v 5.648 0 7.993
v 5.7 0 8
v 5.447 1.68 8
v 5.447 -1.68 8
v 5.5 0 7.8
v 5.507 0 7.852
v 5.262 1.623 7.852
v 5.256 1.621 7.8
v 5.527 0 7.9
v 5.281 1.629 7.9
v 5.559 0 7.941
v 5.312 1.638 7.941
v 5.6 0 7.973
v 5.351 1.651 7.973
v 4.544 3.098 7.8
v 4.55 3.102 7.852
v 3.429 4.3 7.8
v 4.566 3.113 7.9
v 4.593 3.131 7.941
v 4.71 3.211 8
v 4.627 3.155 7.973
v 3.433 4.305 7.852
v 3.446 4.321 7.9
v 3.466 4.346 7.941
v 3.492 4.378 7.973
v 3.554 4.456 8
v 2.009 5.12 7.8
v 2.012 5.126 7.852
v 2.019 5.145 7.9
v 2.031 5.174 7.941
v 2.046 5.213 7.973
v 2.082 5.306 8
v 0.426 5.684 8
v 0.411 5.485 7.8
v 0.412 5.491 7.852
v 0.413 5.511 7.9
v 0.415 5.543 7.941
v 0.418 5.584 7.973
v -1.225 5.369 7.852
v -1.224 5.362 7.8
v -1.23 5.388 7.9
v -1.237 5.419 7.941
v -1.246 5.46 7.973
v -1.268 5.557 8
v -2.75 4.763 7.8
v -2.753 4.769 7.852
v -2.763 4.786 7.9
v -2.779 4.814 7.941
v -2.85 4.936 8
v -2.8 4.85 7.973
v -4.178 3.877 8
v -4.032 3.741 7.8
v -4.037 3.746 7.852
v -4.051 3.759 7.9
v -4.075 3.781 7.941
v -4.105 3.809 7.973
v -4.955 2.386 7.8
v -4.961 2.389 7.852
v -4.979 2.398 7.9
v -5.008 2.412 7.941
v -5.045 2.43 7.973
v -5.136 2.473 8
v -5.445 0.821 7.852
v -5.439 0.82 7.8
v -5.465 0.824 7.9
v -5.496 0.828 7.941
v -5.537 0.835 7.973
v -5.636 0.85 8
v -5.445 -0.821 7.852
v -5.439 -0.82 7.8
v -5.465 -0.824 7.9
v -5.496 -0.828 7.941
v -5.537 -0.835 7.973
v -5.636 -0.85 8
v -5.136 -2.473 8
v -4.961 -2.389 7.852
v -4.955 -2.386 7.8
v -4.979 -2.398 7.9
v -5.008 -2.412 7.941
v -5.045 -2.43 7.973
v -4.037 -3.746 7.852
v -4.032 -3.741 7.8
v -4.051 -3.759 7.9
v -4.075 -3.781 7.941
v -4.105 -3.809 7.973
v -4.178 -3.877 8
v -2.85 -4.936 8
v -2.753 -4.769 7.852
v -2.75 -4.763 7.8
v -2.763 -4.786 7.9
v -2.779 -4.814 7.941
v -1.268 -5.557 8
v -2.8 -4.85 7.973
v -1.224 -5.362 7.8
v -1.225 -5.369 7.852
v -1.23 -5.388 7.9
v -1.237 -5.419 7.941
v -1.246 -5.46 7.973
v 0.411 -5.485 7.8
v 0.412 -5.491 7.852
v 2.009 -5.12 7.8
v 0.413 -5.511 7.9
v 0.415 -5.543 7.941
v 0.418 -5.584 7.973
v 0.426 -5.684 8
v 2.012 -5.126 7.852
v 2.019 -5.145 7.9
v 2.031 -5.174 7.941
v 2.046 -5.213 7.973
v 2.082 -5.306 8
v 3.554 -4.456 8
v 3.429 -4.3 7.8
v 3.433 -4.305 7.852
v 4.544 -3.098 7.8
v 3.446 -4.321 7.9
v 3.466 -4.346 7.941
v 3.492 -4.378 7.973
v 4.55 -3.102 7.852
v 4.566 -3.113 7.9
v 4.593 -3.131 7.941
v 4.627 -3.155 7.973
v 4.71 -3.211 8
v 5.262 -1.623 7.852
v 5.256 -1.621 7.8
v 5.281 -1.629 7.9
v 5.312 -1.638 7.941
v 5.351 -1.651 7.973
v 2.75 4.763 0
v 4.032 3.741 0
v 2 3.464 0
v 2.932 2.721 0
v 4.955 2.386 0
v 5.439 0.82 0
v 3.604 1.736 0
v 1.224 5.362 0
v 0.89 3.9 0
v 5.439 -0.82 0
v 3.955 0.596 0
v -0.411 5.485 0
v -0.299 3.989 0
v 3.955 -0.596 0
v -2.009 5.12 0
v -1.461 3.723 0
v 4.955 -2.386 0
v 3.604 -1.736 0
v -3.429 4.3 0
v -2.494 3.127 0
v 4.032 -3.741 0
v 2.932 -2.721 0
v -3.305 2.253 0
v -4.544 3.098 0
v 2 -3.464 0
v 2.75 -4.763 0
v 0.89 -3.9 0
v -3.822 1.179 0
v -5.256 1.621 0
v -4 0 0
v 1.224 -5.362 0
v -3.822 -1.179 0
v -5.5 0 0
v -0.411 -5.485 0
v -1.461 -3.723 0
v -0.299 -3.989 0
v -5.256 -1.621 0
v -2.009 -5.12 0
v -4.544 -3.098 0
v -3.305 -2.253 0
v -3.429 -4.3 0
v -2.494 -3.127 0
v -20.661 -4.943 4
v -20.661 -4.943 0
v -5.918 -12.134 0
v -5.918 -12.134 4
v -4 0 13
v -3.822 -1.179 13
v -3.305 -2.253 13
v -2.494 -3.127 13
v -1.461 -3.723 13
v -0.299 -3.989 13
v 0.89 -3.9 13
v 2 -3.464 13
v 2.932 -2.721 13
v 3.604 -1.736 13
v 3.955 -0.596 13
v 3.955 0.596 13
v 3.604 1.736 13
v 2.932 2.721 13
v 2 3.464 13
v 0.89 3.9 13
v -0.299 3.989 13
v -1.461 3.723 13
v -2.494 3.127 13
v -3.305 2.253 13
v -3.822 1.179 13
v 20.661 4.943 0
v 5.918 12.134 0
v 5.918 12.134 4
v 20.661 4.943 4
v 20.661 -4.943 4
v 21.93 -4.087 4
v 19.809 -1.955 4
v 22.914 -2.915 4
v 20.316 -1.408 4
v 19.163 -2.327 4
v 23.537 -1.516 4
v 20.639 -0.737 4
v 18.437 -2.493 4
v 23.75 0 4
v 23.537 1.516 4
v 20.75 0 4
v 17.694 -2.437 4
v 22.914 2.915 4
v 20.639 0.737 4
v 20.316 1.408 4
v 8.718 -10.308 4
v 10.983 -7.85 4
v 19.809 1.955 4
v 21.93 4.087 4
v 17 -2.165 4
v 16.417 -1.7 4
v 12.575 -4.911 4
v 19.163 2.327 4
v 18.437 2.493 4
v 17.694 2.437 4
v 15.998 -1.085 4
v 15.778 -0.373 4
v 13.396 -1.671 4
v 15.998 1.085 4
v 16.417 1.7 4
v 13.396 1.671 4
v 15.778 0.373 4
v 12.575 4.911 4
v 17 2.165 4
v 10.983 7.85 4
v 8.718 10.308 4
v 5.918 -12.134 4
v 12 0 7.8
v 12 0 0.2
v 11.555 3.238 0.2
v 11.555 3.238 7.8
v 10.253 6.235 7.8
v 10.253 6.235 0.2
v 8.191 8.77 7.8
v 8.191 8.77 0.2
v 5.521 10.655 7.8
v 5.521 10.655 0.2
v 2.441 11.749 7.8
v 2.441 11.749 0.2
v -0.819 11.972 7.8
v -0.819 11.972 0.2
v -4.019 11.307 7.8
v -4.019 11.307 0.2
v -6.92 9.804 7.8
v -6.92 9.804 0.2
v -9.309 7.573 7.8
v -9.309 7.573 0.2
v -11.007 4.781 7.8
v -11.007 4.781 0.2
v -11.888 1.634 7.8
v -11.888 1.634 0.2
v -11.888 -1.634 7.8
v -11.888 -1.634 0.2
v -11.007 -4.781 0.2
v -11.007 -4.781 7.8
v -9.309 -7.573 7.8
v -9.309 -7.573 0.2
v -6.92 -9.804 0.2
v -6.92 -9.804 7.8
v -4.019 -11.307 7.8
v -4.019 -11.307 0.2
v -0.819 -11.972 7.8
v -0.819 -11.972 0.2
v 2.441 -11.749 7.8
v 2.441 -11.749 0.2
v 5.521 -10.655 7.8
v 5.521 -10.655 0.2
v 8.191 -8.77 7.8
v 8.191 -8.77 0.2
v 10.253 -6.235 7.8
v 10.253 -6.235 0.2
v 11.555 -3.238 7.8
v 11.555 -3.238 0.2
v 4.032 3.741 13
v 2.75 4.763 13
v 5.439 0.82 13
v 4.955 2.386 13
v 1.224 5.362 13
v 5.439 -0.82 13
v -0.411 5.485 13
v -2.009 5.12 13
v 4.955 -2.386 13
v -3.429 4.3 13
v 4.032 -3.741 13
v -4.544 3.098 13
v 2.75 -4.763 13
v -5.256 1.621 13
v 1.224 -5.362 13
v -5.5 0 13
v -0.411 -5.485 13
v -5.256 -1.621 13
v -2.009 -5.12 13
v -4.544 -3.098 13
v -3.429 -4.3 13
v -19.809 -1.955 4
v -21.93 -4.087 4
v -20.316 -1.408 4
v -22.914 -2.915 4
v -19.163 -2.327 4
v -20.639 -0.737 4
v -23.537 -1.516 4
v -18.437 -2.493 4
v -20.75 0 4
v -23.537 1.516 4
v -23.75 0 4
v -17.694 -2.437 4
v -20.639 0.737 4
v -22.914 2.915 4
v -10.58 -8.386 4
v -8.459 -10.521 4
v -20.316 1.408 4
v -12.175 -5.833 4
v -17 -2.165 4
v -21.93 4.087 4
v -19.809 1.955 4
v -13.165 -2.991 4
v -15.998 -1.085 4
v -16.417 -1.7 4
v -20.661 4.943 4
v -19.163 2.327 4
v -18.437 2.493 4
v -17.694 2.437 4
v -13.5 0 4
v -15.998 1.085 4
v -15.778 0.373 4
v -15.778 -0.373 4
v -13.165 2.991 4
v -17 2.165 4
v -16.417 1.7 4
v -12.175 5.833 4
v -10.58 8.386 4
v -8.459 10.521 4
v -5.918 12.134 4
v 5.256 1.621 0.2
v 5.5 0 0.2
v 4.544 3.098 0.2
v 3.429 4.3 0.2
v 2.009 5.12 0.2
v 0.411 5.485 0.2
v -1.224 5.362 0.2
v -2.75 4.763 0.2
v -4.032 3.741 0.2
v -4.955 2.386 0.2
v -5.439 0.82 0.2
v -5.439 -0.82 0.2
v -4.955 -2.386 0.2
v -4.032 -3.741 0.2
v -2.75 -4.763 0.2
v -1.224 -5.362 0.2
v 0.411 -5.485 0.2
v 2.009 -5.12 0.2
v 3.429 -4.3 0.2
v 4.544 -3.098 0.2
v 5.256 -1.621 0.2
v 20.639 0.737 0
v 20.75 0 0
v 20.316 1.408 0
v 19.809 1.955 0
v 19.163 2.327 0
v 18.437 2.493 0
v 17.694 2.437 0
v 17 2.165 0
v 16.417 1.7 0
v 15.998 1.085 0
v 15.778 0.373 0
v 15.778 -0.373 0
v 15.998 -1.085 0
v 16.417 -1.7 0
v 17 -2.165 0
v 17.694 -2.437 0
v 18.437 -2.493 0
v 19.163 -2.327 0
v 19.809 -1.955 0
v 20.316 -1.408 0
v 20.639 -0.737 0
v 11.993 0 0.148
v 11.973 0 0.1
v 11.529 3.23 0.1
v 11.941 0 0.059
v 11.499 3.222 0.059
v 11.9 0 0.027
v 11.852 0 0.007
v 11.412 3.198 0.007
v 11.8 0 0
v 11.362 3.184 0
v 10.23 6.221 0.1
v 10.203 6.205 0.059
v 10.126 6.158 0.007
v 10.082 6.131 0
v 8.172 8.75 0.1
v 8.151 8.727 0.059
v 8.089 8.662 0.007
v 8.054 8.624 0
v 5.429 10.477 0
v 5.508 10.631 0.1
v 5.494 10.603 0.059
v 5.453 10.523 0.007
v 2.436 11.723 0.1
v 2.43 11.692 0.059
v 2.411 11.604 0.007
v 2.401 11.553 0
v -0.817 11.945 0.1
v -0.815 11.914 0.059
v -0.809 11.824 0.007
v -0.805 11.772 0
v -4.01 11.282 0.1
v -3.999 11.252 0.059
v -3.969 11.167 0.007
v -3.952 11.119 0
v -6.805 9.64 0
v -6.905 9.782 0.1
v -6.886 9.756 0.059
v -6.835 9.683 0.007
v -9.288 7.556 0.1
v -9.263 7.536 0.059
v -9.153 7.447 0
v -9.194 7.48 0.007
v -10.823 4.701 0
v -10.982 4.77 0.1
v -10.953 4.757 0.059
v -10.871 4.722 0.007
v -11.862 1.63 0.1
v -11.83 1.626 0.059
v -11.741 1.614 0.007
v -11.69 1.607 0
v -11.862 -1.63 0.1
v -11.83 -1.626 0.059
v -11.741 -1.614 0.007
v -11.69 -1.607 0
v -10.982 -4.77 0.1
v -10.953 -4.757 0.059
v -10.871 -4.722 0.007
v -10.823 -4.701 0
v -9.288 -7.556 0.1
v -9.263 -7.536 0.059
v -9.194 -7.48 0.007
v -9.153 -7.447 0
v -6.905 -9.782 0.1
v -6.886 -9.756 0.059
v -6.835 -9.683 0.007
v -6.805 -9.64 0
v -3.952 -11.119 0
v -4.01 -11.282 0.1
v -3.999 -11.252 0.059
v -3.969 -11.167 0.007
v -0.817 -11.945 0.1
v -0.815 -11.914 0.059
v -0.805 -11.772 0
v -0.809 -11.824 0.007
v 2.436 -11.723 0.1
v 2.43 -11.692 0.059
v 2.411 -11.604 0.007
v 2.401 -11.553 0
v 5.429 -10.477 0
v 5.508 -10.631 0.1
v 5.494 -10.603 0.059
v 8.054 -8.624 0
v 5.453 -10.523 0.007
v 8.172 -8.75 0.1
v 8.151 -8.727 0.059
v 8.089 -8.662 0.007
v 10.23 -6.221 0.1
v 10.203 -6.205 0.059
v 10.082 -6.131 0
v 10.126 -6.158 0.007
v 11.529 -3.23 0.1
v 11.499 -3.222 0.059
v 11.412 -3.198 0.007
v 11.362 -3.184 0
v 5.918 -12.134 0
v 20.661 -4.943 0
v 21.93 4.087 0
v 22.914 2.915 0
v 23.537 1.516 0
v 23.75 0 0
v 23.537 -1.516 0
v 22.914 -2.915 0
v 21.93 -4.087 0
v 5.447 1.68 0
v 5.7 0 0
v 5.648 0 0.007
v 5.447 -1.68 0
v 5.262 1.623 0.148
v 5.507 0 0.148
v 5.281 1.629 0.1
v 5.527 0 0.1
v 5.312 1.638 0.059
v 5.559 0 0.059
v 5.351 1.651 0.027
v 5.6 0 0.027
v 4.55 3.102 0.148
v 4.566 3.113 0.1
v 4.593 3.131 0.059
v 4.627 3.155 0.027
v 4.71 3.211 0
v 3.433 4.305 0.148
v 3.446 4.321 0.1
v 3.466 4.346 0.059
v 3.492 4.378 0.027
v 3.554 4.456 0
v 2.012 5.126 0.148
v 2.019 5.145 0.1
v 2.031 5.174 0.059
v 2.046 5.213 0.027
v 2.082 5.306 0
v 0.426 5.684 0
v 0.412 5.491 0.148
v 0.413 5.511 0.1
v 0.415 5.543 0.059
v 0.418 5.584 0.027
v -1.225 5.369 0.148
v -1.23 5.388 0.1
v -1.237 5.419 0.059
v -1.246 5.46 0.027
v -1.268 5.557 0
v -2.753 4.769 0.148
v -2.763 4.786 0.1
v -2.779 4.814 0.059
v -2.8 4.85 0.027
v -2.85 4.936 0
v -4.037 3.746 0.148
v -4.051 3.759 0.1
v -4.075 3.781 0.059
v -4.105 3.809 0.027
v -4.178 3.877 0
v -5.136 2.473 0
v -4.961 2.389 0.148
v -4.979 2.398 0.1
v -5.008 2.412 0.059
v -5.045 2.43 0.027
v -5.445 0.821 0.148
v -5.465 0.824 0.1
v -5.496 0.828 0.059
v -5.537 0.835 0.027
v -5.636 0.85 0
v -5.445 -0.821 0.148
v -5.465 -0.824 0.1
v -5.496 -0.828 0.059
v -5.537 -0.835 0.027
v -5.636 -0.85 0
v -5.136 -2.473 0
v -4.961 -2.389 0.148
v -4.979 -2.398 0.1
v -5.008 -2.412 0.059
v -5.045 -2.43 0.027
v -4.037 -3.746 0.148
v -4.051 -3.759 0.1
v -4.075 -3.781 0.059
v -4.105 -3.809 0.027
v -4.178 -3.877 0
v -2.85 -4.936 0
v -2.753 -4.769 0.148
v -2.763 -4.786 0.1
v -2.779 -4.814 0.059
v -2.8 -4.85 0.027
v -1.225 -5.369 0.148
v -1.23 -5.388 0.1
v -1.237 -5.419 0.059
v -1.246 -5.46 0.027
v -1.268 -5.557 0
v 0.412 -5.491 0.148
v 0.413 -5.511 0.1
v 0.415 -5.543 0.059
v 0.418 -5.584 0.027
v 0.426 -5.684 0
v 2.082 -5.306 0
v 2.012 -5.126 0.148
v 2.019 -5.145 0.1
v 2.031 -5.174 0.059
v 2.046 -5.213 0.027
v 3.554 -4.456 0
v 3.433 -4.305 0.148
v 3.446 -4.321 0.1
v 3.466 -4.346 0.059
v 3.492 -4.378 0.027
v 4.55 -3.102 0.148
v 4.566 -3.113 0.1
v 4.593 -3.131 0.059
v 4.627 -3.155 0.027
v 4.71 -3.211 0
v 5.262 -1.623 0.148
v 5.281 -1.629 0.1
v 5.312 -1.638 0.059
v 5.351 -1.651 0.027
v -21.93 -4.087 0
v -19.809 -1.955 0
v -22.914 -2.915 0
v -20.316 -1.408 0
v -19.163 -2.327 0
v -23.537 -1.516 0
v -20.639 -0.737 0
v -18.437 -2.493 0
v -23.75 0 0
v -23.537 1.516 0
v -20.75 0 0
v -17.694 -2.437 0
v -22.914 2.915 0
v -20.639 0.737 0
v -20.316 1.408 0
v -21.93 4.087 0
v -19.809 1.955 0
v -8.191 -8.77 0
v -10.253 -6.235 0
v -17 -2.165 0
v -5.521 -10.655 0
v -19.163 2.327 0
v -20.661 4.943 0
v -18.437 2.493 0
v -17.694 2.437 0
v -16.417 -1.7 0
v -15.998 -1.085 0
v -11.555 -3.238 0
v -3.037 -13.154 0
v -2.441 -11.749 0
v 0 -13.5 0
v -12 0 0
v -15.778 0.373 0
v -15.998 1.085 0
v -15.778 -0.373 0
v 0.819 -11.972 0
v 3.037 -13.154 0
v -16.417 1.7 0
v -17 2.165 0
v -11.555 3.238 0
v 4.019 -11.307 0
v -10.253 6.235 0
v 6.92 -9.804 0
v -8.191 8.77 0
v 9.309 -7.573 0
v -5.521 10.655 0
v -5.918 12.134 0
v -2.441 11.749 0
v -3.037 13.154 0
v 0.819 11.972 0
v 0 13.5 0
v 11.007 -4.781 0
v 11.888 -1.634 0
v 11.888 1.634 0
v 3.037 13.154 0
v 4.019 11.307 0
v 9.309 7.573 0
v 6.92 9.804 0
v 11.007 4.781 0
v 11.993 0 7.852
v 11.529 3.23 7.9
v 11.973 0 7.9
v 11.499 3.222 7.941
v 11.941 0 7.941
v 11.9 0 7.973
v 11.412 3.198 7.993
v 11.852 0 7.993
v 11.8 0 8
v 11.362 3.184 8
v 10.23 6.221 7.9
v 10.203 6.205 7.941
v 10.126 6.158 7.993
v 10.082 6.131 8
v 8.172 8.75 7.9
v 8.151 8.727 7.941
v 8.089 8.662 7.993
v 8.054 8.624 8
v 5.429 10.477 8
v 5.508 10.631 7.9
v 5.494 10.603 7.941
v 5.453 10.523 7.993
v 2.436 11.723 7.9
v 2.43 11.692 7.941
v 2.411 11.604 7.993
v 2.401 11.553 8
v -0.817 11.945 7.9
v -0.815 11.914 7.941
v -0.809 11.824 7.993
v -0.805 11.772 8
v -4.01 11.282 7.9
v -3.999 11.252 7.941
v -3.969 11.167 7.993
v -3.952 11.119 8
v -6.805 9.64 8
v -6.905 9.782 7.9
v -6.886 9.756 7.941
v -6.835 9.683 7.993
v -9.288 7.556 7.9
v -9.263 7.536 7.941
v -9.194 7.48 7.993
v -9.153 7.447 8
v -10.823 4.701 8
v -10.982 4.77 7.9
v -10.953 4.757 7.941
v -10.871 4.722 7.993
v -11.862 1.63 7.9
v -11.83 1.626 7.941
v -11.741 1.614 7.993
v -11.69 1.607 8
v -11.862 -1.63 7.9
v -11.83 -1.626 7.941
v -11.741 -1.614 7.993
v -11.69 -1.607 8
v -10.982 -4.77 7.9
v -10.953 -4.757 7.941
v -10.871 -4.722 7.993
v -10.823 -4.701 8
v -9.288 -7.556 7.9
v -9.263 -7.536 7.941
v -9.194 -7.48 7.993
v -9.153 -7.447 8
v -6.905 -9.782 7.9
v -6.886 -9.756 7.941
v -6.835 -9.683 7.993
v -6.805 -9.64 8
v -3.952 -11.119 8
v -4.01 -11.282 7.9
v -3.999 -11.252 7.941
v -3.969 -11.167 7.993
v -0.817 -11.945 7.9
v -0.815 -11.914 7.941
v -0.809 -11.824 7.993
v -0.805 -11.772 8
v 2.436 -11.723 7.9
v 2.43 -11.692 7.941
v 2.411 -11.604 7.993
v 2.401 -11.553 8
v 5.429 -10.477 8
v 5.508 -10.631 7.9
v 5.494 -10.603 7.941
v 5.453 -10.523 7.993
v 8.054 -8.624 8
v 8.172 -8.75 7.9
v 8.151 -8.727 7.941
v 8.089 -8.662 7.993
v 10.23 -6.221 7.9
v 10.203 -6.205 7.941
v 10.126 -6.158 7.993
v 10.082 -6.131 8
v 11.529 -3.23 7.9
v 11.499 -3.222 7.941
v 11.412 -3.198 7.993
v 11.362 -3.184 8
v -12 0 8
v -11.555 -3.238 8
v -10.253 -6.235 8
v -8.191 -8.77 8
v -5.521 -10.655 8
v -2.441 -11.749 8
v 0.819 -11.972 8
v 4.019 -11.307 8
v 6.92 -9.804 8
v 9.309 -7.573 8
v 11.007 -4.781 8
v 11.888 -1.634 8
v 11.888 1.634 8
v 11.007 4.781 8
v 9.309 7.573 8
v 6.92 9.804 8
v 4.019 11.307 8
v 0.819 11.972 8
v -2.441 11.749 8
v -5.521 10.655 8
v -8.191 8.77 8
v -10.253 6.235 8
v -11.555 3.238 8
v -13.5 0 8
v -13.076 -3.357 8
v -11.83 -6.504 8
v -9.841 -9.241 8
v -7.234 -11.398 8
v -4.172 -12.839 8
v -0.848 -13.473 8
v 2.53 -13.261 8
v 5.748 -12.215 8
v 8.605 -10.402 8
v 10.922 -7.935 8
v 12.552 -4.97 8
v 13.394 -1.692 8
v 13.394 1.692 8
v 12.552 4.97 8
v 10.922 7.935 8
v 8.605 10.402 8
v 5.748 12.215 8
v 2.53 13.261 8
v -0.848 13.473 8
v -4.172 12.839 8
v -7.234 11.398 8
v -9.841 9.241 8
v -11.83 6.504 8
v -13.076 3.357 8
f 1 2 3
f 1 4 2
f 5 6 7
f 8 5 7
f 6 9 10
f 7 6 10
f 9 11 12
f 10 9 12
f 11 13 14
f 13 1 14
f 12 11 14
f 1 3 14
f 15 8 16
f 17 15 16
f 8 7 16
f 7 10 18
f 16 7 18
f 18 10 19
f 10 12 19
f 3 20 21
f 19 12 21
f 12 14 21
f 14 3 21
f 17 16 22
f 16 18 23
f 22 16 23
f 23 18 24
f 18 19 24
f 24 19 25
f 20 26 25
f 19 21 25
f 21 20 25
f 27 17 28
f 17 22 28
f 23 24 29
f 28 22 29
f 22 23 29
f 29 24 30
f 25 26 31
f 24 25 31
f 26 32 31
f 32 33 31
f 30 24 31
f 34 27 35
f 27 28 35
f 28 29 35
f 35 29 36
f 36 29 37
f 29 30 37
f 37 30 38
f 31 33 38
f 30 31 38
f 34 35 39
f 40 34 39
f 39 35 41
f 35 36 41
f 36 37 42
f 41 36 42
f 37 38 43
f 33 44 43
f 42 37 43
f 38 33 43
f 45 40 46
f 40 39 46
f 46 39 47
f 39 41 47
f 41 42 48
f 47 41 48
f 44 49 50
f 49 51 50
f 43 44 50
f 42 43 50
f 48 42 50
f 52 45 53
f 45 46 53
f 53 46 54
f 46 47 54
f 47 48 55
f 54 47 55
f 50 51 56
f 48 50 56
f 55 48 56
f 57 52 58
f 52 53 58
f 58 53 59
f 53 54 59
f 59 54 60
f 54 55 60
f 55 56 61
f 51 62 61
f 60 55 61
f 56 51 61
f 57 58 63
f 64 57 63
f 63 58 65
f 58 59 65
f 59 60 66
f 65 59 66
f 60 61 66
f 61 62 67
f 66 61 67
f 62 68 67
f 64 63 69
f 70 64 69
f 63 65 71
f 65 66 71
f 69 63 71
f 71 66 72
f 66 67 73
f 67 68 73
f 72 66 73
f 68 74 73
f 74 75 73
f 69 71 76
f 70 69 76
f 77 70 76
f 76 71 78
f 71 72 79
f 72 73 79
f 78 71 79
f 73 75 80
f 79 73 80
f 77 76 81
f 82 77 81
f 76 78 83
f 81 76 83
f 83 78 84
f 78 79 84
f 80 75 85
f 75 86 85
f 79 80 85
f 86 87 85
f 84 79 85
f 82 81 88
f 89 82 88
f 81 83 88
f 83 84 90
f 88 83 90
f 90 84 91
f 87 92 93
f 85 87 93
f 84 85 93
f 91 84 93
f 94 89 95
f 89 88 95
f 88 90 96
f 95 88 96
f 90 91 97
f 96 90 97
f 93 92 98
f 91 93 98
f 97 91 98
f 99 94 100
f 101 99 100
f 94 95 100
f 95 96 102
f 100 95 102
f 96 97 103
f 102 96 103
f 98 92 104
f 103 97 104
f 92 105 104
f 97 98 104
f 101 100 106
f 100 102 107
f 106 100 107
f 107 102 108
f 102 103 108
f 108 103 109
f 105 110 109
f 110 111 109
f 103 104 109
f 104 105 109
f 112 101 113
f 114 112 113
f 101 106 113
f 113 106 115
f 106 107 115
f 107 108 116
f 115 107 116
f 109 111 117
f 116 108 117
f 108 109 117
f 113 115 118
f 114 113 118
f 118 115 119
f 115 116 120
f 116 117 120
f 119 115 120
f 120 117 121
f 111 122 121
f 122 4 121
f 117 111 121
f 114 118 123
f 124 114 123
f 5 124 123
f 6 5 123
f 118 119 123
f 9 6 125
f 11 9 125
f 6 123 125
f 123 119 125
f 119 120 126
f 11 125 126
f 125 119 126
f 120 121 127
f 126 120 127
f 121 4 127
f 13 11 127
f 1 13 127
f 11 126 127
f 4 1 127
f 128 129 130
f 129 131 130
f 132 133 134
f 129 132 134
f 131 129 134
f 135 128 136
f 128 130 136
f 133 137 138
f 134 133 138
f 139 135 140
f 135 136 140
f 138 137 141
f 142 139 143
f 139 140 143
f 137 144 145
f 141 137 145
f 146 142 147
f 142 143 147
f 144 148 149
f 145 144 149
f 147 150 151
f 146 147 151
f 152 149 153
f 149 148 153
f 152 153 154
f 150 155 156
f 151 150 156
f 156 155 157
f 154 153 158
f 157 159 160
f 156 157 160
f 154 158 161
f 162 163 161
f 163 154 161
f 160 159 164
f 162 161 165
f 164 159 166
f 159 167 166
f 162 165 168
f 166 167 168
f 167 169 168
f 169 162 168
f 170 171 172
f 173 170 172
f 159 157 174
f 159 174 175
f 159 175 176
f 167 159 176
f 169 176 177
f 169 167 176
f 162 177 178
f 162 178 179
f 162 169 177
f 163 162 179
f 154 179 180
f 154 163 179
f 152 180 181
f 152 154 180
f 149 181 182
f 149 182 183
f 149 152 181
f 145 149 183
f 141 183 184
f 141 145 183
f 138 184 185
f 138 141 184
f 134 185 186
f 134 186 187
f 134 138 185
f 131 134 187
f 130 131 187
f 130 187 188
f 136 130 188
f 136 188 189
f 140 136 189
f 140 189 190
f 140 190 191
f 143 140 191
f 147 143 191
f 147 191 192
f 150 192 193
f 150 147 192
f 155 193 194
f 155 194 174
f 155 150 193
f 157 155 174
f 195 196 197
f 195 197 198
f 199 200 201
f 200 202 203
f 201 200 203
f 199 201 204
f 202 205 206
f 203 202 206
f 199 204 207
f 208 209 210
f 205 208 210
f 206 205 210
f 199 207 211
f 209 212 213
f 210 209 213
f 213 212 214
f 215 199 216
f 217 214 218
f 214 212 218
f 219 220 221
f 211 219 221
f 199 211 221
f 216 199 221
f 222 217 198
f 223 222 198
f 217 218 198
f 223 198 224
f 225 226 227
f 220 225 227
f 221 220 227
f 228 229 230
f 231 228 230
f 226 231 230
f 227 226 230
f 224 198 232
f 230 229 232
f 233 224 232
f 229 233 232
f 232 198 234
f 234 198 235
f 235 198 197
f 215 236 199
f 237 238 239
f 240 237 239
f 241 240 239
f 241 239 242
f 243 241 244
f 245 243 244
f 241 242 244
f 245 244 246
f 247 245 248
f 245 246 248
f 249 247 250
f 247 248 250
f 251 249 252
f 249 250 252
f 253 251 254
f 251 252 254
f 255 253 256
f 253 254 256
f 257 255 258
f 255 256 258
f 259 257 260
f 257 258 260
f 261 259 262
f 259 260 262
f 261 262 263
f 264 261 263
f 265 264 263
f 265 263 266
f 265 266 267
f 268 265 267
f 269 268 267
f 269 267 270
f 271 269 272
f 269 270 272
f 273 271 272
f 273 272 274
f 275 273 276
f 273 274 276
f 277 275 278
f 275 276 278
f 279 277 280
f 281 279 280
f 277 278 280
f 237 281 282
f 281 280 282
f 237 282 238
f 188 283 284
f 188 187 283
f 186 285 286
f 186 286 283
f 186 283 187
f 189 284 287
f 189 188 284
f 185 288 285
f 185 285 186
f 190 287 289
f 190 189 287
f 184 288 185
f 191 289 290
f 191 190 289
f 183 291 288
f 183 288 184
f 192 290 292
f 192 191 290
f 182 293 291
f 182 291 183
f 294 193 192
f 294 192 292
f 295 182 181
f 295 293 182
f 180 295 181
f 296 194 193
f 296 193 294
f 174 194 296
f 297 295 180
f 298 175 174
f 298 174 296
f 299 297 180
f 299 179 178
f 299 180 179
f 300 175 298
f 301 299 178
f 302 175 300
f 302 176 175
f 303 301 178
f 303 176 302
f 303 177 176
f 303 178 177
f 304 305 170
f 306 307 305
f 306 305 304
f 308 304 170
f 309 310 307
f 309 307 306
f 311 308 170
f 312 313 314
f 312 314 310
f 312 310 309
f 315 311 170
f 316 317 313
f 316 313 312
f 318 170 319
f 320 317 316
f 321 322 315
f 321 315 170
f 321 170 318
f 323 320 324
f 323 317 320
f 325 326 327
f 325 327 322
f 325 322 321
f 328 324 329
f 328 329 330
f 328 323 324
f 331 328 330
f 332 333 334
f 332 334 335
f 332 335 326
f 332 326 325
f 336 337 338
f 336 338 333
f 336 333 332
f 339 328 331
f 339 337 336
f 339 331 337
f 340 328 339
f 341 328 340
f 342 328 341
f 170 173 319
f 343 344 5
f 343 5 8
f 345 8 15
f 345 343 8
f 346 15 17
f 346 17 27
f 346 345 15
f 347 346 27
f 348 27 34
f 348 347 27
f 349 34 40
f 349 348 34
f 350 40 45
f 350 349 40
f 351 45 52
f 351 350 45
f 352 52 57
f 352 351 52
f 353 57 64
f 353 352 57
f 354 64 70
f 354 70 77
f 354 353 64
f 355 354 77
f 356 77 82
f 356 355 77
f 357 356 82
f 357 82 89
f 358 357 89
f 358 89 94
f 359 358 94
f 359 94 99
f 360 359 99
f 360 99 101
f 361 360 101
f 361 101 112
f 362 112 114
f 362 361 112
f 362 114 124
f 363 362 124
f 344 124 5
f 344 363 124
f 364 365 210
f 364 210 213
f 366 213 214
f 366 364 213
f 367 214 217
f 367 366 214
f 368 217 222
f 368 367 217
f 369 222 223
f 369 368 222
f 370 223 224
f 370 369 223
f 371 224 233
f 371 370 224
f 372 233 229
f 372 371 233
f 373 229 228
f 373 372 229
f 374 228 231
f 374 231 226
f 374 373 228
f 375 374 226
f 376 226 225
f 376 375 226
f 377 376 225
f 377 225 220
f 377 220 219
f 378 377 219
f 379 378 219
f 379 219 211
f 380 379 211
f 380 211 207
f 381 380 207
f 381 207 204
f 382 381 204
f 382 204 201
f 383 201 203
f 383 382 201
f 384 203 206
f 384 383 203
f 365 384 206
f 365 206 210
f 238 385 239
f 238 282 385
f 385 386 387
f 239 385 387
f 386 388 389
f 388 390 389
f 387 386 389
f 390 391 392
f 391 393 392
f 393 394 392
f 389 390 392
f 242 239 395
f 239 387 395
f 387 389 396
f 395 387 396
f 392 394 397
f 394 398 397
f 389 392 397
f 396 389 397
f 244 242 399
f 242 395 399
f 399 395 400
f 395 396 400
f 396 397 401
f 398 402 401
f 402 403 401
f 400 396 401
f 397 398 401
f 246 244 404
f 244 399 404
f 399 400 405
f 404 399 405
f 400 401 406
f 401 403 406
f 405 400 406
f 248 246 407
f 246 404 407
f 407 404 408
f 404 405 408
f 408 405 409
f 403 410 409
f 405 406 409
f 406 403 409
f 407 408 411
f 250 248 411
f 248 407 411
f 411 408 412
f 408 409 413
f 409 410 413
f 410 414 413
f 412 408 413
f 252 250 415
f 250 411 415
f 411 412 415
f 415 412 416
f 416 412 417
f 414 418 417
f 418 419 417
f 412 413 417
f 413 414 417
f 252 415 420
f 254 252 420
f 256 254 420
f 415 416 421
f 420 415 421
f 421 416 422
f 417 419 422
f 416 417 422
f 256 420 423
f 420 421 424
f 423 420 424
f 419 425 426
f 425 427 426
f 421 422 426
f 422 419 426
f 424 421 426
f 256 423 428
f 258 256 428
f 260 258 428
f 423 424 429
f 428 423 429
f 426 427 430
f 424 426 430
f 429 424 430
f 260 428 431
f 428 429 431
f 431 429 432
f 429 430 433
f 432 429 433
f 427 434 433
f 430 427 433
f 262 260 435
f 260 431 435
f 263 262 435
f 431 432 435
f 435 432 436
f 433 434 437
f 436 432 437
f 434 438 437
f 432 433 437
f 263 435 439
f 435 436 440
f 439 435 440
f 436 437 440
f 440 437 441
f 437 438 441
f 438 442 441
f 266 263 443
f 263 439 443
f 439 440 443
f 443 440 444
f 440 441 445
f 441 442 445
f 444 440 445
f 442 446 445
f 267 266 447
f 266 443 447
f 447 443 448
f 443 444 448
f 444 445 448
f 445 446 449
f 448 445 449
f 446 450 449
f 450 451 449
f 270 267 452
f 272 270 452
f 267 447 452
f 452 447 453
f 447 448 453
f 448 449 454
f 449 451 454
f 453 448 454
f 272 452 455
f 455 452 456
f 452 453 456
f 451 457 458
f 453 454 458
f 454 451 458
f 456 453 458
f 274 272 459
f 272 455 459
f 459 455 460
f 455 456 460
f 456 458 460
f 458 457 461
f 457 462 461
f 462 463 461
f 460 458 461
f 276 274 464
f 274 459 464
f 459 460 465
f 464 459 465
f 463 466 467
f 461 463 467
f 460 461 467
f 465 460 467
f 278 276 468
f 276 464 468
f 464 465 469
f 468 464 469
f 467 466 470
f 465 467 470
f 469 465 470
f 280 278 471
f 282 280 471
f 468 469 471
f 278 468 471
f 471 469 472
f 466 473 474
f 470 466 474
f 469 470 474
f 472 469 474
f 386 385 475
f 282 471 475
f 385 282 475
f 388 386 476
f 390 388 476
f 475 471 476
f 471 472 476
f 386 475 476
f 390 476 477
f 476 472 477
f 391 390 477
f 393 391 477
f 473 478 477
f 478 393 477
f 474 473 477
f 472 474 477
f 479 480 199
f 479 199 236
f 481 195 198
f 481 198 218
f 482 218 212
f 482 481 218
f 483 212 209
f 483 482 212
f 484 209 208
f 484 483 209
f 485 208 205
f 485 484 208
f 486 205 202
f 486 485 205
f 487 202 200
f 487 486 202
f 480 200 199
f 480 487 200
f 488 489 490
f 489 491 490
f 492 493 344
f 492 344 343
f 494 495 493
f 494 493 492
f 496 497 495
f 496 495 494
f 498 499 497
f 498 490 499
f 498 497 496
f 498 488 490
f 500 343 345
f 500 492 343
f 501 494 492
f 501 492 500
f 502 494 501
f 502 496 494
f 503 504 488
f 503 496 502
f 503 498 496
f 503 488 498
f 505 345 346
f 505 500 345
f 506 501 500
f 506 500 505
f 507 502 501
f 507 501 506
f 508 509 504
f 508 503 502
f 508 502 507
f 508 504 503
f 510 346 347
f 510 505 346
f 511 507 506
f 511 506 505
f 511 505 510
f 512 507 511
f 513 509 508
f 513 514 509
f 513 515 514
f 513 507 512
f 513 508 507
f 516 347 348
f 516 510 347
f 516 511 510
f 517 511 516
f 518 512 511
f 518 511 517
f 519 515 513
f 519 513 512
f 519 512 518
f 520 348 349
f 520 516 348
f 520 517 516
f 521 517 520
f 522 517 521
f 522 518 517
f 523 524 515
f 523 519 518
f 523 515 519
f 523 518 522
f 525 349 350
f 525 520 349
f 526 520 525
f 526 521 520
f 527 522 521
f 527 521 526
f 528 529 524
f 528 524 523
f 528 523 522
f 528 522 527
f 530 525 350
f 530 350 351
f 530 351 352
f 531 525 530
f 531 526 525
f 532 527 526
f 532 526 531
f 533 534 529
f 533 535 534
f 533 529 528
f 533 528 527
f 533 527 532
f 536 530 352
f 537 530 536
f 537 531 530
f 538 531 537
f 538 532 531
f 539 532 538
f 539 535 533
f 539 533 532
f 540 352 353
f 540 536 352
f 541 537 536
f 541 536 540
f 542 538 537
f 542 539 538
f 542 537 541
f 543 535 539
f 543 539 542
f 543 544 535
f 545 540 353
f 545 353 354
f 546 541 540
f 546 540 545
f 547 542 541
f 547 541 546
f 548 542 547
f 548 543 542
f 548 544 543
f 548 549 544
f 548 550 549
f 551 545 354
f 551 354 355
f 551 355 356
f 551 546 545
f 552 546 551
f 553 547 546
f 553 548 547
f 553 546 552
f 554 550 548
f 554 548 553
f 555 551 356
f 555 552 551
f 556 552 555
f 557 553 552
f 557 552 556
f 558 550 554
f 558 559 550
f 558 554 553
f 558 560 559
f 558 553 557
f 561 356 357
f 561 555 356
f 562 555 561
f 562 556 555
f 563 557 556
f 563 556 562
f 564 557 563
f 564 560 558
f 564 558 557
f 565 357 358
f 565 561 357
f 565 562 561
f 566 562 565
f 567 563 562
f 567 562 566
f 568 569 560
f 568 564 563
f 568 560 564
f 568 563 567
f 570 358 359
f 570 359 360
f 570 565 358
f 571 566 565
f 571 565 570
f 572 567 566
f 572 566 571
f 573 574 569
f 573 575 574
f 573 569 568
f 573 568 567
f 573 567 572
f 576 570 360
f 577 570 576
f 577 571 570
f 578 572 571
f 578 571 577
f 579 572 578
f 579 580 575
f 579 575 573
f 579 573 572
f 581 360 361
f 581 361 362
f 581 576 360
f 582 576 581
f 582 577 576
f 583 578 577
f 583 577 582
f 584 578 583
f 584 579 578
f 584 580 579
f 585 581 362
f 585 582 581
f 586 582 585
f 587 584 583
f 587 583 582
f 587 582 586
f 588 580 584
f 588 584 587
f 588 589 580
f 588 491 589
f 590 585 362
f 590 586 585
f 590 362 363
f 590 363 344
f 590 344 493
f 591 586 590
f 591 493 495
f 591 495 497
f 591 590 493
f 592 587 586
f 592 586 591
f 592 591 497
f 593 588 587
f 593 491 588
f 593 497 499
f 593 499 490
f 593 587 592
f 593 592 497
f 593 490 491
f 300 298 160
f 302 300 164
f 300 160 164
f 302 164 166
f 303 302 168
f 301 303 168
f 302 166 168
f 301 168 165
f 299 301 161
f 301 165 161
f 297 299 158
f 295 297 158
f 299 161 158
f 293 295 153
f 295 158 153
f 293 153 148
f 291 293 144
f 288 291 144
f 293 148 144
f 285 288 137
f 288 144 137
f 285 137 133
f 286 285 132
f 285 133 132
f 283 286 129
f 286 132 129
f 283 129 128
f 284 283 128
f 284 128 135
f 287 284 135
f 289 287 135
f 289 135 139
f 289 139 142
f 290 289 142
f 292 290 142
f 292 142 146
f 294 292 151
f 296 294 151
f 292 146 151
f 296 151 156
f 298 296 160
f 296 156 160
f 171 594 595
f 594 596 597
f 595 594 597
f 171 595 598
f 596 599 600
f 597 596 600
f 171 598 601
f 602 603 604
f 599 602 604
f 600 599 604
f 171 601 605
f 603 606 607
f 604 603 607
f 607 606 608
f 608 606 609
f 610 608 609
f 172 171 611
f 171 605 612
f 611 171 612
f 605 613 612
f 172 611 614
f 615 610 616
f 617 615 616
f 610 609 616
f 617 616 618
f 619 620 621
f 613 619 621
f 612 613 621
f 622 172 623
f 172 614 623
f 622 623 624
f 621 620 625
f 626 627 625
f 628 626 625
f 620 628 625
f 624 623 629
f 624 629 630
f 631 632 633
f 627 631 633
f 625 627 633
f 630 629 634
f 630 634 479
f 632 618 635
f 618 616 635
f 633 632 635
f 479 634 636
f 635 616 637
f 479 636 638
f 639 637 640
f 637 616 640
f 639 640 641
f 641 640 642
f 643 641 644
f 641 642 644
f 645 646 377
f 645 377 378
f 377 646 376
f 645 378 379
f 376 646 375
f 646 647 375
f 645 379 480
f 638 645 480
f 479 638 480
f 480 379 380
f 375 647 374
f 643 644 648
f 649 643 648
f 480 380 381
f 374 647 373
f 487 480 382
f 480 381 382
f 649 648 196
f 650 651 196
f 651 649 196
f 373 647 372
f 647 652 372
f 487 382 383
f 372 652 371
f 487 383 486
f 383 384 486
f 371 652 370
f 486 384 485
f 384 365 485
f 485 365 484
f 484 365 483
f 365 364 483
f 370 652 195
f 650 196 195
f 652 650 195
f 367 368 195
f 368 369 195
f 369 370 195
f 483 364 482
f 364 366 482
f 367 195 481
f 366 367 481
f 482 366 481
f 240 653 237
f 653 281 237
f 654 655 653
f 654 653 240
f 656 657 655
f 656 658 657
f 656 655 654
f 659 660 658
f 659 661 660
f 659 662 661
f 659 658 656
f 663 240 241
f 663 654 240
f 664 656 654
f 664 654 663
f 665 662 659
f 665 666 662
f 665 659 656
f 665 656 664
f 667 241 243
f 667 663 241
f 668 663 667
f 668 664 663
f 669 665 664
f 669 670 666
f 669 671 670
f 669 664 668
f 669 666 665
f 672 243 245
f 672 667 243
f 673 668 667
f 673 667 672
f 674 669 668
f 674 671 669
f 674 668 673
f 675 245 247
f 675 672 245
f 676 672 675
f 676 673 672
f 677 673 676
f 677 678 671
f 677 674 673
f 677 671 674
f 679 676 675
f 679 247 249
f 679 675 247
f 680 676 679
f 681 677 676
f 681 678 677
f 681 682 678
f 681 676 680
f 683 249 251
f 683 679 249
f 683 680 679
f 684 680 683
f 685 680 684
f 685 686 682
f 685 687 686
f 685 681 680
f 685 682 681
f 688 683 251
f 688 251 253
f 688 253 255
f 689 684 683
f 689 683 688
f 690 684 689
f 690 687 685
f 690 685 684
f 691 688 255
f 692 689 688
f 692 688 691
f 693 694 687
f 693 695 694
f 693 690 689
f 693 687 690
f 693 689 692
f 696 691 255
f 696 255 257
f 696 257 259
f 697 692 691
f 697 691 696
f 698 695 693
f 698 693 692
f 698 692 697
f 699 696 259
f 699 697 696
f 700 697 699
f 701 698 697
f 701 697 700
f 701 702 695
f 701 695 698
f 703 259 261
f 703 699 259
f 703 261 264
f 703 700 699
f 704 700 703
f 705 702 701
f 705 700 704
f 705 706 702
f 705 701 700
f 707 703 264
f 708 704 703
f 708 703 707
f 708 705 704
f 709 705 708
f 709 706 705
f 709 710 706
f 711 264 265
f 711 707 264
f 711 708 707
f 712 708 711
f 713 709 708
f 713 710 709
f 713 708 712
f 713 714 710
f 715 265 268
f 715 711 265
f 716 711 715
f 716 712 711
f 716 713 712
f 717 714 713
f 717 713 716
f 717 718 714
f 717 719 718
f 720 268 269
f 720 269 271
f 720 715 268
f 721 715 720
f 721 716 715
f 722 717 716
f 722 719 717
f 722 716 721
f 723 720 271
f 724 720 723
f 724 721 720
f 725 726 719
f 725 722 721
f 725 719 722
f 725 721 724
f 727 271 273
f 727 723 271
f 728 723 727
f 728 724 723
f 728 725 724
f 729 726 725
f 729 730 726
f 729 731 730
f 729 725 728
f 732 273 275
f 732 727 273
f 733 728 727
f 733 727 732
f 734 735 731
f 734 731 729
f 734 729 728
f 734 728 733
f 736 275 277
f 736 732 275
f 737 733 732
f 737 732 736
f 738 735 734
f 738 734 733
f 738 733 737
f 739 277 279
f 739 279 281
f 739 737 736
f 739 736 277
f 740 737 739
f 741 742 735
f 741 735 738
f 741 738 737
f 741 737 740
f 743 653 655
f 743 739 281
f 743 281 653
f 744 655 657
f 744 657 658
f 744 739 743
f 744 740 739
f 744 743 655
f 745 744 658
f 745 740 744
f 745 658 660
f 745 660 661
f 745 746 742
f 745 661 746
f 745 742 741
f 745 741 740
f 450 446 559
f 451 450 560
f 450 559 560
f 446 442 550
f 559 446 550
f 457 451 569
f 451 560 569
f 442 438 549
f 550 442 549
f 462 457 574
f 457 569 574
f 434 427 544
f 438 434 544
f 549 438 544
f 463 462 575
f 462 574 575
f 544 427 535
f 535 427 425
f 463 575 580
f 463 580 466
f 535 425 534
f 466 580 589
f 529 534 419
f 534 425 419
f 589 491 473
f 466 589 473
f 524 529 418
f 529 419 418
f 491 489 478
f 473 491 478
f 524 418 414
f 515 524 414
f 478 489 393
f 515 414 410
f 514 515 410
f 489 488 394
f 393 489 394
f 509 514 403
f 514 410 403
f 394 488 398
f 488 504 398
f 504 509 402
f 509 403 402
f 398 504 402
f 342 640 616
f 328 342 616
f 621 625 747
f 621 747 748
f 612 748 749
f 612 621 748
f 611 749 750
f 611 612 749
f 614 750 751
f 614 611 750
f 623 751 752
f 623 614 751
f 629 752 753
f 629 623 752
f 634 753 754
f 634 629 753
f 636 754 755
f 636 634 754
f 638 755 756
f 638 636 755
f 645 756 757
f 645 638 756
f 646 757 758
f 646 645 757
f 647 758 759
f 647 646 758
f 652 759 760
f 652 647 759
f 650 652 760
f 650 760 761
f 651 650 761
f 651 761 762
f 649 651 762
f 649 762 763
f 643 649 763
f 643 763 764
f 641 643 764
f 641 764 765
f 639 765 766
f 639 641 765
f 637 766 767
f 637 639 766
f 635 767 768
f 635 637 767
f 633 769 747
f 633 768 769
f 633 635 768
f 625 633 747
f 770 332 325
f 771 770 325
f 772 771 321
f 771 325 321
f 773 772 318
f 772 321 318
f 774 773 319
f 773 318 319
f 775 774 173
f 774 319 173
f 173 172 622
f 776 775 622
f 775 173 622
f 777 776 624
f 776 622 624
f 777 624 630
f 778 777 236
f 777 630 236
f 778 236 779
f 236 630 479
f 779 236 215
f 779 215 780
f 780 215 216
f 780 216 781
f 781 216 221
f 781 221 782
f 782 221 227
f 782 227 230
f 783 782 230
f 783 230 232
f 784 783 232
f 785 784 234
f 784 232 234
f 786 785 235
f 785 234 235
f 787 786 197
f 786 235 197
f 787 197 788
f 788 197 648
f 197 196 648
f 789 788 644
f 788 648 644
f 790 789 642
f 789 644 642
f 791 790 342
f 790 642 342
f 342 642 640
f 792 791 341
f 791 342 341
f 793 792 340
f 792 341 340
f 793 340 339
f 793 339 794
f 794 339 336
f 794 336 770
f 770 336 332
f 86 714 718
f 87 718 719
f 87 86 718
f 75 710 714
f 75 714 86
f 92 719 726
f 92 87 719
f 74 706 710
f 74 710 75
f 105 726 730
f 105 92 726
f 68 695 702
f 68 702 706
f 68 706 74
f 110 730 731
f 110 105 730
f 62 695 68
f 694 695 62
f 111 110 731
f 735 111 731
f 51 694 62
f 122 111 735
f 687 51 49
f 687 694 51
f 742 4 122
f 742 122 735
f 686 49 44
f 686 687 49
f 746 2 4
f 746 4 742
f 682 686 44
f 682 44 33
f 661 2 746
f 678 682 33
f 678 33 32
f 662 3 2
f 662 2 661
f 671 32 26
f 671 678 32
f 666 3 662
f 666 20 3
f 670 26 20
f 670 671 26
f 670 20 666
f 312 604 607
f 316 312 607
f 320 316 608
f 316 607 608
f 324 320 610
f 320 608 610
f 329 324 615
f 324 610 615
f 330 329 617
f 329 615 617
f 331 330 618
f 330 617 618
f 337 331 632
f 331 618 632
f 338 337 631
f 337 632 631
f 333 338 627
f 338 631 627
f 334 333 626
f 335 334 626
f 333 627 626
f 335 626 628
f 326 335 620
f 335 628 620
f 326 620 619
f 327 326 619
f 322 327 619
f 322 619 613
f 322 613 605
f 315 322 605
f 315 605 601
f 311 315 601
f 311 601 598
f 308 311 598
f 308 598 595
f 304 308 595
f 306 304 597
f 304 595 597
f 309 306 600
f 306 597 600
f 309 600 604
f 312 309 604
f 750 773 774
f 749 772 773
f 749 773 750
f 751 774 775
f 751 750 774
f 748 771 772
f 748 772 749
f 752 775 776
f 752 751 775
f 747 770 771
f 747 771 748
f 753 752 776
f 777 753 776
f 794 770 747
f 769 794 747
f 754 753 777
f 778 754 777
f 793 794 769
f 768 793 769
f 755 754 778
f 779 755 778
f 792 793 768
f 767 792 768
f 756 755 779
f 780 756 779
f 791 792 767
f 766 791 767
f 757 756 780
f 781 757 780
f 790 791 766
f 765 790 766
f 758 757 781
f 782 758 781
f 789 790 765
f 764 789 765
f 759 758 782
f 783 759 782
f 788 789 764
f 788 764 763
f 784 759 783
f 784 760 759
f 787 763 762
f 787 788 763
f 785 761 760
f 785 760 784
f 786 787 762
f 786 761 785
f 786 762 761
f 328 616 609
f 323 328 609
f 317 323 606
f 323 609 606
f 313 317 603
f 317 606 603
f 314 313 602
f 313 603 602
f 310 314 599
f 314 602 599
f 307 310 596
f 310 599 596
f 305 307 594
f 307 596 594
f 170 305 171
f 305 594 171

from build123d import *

# Parameters (mm, degrees)
SKETCH1_R             = 13.5
SKETCH1_R_2           = 12
BOSS_EXTRUDE1_DEPTH   = 13
SKETCH1_R_3           = 5.5
SKETCH1_R_4           = 4
BOSS_EXTRUDE1_2_DEPTH = 13
SKETCH2_R             = 2.5
BOSS_EXTRUDE3_DEPTH   = 4
SKETCH4_W             = 74
SKETCH4_H             = 74
SKETCH4_R             = 8.75
CUT_EXTRUDE1_DEPTH    = 5
SKETCH1_3_R           = 12
SKETCH1_3_R_2         = 5.5
BOSS_EXTRUDE2_DEPTH   = 8
FILLET6_R             = 0.2


with BuildPart() as part:
    # Sketch1 → Boss-Extrude1 (new body)
    with BuildSketch(Plane.XY):
        with Locations(Location((0, 0, 0), (0, 0, 180))):
            Circle(SKETCH1_R)
        with Locations(Location((0, 0, 0), (0, 0, 180))):
            Circle(SKETCH1_R_2, mode=Mode.SUBTRACT)
    extrude(amount=BOSS_EXTRUDE1_DEPTH)

    # Sketch2 → Boss-Extrude3 (add)
    with BuildSketch(Plane(origin=(0, 0, 0), x_dir=(-1, 0, 0), z_dir=(0, 0, -1))):
        with BuildLine():
            Line((5.917808219, 12.133818273), (20.660958904, 4.943407445))
            ThreePointArc((20.660958904, 4.943407445), (23.75, 0), (20.660958904, -4.943407445))
            Line((20.660958904, -4.943407445), (5.917808219, -12.133818273))
            ThreePointArc((5.917808219, -12.133818273), (13.5, 0), (5.917808219, 12.133818273))
        make_face()
        with Locations((18.25, 0)):
            Circle(SKETCH2_R, mode=Mode.SUBTRACT)
    boss_extrude3 = extrude(amount=-BOSS_EXTRUDE3_DEPTH)

    # Mirror1: Boss-Extrude3 across plane
    add(boss_extrude3.mirror(Plane(origin=(0, 0, 0), x_dir=(0, 0, 1), z_dir=(1, 0, 0))))

    # Sketch4 → Cut-Extrude1 (cut)
    with BuildSketch(Plane.XY.offset(13)):
        Rectangle(SKETCH4_W, SKETCH4_H)
        Circle(SKETCH4_R, mode=Mode.SUBTRACT)
    extrude(amount=-CUT_EXTRUDE1_DEPTH, mode=Mode.SUBTRACT)


with BuildPart() as body_2:
    # Sketch1 → Boss-Extrude1 2 (new body)
    with BuildSketch(Plane.XY):
        with Locations(Location((0, 0, 0), (0, 0, 180))):
            Circle(SKETCH1_R_3)
        with Locations(Location((0, 0, 0), (0, 0, 180))):
            Circle(SKETCH1_R_4, mode=Mode.SUBTRACT)
    extrude(amount=BOSS_EXTRUDE1_2_DEPTH)


with BuildPart() as body_3:
    # Sketch1<3> → Boss-Extrude2 (new body)
    with BuildSketch(Plane.XY):
        Circle(SKETCH1_3_R)
        Circle(SKETCH1_3_R_2, mode=Mode.SUBTRACT)
    extrude(amount=BOSS_EXTRUDE2_DEPTH)

    # Fillet6
    fillet6_edges = [body_3.edges().sort_by_distance(p)[0] for p in [
        (-12, 0, 8),
        (-12, 0, 0),
        (-5.5, 0, 0),
        (-5.5, 0, 8),
    ]]
    fillet(fillet6_edges, radius=FILLET6_R)


solid = Compound([part.part, body_2.part, body_3.part])
